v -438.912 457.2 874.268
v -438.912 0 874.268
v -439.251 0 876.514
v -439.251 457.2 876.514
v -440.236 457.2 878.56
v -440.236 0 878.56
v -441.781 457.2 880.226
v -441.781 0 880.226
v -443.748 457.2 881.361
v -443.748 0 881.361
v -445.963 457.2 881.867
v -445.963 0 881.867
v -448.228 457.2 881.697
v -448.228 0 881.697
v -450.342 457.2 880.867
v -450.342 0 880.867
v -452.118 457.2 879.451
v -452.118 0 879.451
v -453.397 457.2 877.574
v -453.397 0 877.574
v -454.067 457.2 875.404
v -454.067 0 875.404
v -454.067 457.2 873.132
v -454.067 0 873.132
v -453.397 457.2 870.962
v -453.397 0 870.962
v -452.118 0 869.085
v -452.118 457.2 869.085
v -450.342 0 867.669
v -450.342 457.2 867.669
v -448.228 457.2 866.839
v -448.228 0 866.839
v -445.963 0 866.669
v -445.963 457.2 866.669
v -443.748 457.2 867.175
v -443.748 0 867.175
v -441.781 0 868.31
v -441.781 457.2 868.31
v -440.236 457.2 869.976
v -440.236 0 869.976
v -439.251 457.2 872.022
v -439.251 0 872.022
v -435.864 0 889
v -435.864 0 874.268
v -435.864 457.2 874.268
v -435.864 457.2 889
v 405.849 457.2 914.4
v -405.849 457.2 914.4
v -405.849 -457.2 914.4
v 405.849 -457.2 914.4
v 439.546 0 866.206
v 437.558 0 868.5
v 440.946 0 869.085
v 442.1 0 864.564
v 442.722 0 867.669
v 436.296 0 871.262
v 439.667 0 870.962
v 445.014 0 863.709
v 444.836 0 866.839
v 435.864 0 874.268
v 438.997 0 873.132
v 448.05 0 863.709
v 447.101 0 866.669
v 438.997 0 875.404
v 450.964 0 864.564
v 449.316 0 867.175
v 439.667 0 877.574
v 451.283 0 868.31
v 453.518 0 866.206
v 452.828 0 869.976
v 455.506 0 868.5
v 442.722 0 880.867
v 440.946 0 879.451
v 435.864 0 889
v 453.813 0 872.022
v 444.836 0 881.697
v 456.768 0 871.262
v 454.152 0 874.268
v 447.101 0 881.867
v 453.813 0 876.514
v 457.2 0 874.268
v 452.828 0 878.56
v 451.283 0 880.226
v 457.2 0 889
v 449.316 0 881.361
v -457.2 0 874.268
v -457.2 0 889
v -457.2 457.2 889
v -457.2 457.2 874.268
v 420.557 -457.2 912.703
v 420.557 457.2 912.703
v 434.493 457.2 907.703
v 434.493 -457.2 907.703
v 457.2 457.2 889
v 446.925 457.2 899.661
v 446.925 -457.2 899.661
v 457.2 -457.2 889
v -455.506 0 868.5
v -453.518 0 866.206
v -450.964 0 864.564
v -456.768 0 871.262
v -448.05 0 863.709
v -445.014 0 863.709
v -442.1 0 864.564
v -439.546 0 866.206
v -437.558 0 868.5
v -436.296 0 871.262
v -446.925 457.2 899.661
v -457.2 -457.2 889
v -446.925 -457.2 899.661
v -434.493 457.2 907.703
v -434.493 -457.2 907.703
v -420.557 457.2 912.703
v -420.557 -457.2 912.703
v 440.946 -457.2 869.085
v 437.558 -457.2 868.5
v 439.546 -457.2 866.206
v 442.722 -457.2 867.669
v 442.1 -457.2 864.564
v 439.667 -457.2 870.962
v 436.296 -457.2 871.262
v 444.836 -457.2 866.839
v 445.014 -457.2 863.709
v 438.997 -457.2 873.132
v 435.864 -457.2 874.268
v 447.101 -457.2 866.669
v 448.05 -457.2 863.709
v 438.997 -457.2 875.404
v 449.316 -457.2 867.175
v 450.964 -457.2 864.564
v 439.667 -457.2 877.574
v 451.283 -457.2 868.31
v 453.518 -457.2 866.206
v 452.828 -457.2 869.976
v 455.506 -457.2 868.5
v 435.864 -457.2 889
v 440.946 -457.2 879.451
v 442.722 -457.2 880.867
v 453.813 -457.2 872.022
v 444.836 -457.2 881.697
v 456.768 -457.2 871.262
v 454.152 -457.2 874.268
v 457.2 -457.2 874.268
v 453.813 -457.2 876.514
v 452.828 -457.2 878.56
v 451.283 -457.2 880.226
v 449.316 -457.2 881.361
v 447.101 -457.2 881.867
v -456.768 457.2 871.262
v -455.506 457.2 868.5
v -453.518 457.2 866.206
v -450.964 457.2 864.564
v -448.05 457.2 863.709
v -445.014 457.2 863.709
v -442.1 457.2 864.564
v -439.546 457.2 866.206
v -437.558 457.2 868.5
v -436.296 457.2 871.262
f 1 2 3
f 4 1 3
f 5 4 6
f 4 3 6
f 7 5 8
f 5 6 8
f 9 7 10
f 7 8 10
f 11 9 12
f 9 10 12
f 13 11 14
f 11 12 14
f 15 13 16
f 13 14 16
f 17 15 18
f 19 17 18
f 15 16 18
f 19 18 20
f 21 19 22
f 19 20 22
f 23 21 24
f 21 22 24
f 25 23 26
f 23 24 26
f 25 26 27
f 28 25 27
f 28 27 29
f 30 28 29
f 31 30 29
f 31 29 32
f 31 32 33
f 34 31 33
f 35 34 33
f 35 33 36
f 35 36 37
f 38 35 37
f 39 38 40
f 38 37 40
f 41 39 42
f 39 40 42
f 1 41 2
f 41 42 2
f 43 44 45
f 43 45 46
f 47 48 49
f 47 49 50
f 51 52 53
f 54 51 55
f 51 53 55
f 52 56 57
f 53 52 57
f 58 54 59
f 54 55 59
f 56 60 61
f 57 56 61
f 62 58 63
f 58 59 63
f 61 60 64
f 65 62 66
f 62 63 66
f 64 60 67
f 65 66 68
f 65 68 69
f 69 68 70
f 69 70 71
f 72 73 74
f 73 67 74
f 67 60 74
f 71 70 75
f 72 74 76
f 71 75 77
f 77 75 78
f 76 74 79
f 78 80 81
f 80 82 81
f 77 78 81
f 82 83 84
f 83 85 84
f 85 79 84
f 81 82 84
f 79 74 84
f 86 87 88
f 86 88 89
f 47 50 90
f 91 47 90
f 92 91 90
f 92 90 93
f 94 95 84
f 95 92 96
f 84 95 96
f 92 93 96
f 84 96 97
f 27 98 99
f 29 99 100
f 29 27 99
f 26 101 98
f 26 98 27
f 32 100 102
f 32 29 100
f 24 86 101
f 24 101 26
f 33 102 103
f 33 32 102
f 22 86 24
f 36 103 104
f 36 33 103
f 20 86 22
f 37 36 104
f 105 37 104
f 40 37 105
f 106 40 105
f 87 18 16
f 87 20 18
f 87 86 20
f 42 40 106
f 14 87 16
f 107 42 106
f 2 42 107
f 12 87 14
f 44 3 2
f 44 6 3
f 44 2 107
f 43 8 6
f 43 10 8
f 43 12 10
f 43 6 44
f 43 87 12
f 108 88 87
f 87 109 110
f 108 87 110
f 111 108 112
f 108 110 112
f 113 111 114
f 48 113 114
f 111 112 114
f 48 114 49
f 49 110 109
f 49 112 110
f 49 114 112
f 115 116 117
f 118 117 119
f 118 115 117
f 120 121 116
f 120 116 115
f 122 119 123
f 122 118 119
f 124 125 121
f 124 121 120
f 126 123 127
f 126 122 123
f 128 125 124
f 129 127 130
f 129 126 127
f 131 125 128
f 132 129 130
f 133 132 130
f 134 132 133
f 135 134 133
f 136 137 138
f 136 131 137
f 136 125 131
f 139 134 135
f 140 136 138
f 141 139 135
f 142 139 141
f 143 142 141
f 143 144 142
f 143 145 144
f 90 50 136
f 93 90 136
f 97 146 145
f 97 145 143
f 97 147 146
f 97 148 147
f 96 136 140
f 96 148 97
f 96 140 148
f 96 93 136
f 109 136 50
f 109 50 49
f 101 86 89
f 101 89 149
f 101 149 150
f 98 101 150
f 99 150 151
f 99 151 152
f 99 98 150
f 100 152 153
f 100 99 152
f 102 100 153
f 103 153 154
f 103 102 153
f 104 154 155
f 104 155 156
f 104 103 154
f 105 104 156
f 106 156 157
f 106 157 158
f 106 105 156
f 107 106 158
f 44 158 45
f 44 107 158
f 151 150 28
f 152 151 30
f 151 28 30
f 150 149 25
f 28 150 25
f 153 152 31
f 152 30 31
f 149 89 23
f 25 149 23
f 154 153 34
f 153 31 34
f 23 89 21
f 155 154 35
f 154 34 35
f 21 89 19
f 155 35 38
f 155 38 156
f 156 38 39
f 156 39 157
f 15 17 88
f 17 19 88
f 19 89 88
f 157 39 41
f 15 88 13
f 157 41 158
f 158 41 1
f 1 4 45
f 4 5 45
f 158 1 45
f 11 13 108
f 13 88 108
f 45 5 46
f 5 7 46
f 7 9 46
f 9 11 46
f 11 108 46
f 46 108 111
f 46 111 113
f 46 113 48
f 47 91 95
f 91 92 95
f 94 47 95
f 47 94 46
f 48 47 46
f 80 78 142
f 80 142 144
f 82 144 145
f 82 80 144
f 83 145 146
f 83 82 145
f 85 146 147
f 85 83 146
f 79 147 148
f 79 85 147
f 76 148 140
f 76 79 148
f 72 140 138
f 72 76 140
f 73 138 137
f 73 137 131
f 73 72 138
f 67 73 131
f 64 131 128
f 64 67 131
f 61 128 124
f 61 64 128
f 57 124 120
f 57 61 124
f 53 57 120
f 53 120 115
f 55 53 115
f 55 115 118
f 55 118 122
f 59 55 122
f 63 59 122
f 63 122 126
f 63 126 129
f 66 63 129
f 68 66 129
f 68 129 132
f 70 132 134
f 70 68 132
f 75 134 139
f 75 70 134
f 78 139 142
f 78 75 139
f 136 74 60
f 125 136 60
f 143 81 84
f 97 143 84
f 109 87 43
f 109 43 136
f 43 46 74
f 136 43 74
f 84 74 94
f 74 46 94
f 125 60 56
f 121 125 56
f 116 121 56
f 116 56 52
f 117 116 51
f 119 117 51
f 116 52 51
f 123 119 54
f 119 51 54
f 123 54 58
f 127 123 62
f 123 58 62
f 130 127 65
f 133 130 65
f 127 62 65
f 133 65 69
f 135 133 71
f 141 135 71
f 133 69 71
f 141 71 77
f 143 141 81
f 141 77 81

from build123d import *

# Parameters (mm, degrees)
F1_W     = 914.4
F1_H     = 914.4
F2_DEPTH = 25.4
F4_DEPTH = 914.4
F6_R     = 7.62
F7_DEPTH = 457.2
F8_DEPTH = 457.2


with BuildPart() as f2:
    # F1 (on offset) → F2 (new body)
    with BuildSketch(Plane.XY.offset(914.4)):
        Rectangle(F1_W, F1_H)
    extrude(amount=-F2_DEPTH)

    # F3 (on face) → F4 (cut, through all)
    with BuildSketch(Plane.XZ.offset(457.2)):
        with BuildLine():
            ThreePointArc((-457.2, 889), (-434.4934859844, 907.702903129), (-405.8485342879, 914.4))
            Line((-405.8485342879, 914.4), (-457.2, 914.4))
            Line((-457.2, 914.4), (-457.2, 889))
        make_face()
        with BuildLine():
            Line((457.2, 889), (457.2, 914.4))
            Line((457.2, 914.4), (405.8485342879, 914.4))
            ThreePointArc((405.8485342879, 914.4), (434.4934859844, 907.702903129), (457.2, 889))
        make_face()
    extrude(amount=-F4_DEPTH, mode=Mode.SUBTRACT)

    # F6 (on Front) → F7 (join, through all)
    with BuildSketch(Plane.XZ):
        with BuildLine():
            Line((-457.2, 889), (-457.2, 874.268))
            ThreePointArc((-457.2, 874.268), (-446.532, 863.6), (-435.864, 874.268))
            Line((-435.864, 874.268), (-435.864, 889))
            Line((-435.864, 889), (-457.2, 889))
        make_face()
        with Locations((-446.532, 874.268)):
            Circle(F6_R, mode=Mode.SUBTRACT)
    extrude(amount=-F7_DEPTH)

    # F6 (on Front) → F8 (join, through all)
    with BuildSketch(Plane.XZ):
        with BuildLine():
            Line((435.864, 889), (435.864, 874.268))
            ThreePointArc((435.864, 874.268), (446.532, 863.6), (457.2, 874.268))
            Line((457.2, 874.268), (457.2, 889))
            Line((457.2, 889), (435.864, 889))
        make_face()
        with Locations((446.532, 874.268)):
            Circle(F6_R, mode=Mode.SUBTRACT)
    extrude(amount=F8_DEPTH)


solid = f2.part
